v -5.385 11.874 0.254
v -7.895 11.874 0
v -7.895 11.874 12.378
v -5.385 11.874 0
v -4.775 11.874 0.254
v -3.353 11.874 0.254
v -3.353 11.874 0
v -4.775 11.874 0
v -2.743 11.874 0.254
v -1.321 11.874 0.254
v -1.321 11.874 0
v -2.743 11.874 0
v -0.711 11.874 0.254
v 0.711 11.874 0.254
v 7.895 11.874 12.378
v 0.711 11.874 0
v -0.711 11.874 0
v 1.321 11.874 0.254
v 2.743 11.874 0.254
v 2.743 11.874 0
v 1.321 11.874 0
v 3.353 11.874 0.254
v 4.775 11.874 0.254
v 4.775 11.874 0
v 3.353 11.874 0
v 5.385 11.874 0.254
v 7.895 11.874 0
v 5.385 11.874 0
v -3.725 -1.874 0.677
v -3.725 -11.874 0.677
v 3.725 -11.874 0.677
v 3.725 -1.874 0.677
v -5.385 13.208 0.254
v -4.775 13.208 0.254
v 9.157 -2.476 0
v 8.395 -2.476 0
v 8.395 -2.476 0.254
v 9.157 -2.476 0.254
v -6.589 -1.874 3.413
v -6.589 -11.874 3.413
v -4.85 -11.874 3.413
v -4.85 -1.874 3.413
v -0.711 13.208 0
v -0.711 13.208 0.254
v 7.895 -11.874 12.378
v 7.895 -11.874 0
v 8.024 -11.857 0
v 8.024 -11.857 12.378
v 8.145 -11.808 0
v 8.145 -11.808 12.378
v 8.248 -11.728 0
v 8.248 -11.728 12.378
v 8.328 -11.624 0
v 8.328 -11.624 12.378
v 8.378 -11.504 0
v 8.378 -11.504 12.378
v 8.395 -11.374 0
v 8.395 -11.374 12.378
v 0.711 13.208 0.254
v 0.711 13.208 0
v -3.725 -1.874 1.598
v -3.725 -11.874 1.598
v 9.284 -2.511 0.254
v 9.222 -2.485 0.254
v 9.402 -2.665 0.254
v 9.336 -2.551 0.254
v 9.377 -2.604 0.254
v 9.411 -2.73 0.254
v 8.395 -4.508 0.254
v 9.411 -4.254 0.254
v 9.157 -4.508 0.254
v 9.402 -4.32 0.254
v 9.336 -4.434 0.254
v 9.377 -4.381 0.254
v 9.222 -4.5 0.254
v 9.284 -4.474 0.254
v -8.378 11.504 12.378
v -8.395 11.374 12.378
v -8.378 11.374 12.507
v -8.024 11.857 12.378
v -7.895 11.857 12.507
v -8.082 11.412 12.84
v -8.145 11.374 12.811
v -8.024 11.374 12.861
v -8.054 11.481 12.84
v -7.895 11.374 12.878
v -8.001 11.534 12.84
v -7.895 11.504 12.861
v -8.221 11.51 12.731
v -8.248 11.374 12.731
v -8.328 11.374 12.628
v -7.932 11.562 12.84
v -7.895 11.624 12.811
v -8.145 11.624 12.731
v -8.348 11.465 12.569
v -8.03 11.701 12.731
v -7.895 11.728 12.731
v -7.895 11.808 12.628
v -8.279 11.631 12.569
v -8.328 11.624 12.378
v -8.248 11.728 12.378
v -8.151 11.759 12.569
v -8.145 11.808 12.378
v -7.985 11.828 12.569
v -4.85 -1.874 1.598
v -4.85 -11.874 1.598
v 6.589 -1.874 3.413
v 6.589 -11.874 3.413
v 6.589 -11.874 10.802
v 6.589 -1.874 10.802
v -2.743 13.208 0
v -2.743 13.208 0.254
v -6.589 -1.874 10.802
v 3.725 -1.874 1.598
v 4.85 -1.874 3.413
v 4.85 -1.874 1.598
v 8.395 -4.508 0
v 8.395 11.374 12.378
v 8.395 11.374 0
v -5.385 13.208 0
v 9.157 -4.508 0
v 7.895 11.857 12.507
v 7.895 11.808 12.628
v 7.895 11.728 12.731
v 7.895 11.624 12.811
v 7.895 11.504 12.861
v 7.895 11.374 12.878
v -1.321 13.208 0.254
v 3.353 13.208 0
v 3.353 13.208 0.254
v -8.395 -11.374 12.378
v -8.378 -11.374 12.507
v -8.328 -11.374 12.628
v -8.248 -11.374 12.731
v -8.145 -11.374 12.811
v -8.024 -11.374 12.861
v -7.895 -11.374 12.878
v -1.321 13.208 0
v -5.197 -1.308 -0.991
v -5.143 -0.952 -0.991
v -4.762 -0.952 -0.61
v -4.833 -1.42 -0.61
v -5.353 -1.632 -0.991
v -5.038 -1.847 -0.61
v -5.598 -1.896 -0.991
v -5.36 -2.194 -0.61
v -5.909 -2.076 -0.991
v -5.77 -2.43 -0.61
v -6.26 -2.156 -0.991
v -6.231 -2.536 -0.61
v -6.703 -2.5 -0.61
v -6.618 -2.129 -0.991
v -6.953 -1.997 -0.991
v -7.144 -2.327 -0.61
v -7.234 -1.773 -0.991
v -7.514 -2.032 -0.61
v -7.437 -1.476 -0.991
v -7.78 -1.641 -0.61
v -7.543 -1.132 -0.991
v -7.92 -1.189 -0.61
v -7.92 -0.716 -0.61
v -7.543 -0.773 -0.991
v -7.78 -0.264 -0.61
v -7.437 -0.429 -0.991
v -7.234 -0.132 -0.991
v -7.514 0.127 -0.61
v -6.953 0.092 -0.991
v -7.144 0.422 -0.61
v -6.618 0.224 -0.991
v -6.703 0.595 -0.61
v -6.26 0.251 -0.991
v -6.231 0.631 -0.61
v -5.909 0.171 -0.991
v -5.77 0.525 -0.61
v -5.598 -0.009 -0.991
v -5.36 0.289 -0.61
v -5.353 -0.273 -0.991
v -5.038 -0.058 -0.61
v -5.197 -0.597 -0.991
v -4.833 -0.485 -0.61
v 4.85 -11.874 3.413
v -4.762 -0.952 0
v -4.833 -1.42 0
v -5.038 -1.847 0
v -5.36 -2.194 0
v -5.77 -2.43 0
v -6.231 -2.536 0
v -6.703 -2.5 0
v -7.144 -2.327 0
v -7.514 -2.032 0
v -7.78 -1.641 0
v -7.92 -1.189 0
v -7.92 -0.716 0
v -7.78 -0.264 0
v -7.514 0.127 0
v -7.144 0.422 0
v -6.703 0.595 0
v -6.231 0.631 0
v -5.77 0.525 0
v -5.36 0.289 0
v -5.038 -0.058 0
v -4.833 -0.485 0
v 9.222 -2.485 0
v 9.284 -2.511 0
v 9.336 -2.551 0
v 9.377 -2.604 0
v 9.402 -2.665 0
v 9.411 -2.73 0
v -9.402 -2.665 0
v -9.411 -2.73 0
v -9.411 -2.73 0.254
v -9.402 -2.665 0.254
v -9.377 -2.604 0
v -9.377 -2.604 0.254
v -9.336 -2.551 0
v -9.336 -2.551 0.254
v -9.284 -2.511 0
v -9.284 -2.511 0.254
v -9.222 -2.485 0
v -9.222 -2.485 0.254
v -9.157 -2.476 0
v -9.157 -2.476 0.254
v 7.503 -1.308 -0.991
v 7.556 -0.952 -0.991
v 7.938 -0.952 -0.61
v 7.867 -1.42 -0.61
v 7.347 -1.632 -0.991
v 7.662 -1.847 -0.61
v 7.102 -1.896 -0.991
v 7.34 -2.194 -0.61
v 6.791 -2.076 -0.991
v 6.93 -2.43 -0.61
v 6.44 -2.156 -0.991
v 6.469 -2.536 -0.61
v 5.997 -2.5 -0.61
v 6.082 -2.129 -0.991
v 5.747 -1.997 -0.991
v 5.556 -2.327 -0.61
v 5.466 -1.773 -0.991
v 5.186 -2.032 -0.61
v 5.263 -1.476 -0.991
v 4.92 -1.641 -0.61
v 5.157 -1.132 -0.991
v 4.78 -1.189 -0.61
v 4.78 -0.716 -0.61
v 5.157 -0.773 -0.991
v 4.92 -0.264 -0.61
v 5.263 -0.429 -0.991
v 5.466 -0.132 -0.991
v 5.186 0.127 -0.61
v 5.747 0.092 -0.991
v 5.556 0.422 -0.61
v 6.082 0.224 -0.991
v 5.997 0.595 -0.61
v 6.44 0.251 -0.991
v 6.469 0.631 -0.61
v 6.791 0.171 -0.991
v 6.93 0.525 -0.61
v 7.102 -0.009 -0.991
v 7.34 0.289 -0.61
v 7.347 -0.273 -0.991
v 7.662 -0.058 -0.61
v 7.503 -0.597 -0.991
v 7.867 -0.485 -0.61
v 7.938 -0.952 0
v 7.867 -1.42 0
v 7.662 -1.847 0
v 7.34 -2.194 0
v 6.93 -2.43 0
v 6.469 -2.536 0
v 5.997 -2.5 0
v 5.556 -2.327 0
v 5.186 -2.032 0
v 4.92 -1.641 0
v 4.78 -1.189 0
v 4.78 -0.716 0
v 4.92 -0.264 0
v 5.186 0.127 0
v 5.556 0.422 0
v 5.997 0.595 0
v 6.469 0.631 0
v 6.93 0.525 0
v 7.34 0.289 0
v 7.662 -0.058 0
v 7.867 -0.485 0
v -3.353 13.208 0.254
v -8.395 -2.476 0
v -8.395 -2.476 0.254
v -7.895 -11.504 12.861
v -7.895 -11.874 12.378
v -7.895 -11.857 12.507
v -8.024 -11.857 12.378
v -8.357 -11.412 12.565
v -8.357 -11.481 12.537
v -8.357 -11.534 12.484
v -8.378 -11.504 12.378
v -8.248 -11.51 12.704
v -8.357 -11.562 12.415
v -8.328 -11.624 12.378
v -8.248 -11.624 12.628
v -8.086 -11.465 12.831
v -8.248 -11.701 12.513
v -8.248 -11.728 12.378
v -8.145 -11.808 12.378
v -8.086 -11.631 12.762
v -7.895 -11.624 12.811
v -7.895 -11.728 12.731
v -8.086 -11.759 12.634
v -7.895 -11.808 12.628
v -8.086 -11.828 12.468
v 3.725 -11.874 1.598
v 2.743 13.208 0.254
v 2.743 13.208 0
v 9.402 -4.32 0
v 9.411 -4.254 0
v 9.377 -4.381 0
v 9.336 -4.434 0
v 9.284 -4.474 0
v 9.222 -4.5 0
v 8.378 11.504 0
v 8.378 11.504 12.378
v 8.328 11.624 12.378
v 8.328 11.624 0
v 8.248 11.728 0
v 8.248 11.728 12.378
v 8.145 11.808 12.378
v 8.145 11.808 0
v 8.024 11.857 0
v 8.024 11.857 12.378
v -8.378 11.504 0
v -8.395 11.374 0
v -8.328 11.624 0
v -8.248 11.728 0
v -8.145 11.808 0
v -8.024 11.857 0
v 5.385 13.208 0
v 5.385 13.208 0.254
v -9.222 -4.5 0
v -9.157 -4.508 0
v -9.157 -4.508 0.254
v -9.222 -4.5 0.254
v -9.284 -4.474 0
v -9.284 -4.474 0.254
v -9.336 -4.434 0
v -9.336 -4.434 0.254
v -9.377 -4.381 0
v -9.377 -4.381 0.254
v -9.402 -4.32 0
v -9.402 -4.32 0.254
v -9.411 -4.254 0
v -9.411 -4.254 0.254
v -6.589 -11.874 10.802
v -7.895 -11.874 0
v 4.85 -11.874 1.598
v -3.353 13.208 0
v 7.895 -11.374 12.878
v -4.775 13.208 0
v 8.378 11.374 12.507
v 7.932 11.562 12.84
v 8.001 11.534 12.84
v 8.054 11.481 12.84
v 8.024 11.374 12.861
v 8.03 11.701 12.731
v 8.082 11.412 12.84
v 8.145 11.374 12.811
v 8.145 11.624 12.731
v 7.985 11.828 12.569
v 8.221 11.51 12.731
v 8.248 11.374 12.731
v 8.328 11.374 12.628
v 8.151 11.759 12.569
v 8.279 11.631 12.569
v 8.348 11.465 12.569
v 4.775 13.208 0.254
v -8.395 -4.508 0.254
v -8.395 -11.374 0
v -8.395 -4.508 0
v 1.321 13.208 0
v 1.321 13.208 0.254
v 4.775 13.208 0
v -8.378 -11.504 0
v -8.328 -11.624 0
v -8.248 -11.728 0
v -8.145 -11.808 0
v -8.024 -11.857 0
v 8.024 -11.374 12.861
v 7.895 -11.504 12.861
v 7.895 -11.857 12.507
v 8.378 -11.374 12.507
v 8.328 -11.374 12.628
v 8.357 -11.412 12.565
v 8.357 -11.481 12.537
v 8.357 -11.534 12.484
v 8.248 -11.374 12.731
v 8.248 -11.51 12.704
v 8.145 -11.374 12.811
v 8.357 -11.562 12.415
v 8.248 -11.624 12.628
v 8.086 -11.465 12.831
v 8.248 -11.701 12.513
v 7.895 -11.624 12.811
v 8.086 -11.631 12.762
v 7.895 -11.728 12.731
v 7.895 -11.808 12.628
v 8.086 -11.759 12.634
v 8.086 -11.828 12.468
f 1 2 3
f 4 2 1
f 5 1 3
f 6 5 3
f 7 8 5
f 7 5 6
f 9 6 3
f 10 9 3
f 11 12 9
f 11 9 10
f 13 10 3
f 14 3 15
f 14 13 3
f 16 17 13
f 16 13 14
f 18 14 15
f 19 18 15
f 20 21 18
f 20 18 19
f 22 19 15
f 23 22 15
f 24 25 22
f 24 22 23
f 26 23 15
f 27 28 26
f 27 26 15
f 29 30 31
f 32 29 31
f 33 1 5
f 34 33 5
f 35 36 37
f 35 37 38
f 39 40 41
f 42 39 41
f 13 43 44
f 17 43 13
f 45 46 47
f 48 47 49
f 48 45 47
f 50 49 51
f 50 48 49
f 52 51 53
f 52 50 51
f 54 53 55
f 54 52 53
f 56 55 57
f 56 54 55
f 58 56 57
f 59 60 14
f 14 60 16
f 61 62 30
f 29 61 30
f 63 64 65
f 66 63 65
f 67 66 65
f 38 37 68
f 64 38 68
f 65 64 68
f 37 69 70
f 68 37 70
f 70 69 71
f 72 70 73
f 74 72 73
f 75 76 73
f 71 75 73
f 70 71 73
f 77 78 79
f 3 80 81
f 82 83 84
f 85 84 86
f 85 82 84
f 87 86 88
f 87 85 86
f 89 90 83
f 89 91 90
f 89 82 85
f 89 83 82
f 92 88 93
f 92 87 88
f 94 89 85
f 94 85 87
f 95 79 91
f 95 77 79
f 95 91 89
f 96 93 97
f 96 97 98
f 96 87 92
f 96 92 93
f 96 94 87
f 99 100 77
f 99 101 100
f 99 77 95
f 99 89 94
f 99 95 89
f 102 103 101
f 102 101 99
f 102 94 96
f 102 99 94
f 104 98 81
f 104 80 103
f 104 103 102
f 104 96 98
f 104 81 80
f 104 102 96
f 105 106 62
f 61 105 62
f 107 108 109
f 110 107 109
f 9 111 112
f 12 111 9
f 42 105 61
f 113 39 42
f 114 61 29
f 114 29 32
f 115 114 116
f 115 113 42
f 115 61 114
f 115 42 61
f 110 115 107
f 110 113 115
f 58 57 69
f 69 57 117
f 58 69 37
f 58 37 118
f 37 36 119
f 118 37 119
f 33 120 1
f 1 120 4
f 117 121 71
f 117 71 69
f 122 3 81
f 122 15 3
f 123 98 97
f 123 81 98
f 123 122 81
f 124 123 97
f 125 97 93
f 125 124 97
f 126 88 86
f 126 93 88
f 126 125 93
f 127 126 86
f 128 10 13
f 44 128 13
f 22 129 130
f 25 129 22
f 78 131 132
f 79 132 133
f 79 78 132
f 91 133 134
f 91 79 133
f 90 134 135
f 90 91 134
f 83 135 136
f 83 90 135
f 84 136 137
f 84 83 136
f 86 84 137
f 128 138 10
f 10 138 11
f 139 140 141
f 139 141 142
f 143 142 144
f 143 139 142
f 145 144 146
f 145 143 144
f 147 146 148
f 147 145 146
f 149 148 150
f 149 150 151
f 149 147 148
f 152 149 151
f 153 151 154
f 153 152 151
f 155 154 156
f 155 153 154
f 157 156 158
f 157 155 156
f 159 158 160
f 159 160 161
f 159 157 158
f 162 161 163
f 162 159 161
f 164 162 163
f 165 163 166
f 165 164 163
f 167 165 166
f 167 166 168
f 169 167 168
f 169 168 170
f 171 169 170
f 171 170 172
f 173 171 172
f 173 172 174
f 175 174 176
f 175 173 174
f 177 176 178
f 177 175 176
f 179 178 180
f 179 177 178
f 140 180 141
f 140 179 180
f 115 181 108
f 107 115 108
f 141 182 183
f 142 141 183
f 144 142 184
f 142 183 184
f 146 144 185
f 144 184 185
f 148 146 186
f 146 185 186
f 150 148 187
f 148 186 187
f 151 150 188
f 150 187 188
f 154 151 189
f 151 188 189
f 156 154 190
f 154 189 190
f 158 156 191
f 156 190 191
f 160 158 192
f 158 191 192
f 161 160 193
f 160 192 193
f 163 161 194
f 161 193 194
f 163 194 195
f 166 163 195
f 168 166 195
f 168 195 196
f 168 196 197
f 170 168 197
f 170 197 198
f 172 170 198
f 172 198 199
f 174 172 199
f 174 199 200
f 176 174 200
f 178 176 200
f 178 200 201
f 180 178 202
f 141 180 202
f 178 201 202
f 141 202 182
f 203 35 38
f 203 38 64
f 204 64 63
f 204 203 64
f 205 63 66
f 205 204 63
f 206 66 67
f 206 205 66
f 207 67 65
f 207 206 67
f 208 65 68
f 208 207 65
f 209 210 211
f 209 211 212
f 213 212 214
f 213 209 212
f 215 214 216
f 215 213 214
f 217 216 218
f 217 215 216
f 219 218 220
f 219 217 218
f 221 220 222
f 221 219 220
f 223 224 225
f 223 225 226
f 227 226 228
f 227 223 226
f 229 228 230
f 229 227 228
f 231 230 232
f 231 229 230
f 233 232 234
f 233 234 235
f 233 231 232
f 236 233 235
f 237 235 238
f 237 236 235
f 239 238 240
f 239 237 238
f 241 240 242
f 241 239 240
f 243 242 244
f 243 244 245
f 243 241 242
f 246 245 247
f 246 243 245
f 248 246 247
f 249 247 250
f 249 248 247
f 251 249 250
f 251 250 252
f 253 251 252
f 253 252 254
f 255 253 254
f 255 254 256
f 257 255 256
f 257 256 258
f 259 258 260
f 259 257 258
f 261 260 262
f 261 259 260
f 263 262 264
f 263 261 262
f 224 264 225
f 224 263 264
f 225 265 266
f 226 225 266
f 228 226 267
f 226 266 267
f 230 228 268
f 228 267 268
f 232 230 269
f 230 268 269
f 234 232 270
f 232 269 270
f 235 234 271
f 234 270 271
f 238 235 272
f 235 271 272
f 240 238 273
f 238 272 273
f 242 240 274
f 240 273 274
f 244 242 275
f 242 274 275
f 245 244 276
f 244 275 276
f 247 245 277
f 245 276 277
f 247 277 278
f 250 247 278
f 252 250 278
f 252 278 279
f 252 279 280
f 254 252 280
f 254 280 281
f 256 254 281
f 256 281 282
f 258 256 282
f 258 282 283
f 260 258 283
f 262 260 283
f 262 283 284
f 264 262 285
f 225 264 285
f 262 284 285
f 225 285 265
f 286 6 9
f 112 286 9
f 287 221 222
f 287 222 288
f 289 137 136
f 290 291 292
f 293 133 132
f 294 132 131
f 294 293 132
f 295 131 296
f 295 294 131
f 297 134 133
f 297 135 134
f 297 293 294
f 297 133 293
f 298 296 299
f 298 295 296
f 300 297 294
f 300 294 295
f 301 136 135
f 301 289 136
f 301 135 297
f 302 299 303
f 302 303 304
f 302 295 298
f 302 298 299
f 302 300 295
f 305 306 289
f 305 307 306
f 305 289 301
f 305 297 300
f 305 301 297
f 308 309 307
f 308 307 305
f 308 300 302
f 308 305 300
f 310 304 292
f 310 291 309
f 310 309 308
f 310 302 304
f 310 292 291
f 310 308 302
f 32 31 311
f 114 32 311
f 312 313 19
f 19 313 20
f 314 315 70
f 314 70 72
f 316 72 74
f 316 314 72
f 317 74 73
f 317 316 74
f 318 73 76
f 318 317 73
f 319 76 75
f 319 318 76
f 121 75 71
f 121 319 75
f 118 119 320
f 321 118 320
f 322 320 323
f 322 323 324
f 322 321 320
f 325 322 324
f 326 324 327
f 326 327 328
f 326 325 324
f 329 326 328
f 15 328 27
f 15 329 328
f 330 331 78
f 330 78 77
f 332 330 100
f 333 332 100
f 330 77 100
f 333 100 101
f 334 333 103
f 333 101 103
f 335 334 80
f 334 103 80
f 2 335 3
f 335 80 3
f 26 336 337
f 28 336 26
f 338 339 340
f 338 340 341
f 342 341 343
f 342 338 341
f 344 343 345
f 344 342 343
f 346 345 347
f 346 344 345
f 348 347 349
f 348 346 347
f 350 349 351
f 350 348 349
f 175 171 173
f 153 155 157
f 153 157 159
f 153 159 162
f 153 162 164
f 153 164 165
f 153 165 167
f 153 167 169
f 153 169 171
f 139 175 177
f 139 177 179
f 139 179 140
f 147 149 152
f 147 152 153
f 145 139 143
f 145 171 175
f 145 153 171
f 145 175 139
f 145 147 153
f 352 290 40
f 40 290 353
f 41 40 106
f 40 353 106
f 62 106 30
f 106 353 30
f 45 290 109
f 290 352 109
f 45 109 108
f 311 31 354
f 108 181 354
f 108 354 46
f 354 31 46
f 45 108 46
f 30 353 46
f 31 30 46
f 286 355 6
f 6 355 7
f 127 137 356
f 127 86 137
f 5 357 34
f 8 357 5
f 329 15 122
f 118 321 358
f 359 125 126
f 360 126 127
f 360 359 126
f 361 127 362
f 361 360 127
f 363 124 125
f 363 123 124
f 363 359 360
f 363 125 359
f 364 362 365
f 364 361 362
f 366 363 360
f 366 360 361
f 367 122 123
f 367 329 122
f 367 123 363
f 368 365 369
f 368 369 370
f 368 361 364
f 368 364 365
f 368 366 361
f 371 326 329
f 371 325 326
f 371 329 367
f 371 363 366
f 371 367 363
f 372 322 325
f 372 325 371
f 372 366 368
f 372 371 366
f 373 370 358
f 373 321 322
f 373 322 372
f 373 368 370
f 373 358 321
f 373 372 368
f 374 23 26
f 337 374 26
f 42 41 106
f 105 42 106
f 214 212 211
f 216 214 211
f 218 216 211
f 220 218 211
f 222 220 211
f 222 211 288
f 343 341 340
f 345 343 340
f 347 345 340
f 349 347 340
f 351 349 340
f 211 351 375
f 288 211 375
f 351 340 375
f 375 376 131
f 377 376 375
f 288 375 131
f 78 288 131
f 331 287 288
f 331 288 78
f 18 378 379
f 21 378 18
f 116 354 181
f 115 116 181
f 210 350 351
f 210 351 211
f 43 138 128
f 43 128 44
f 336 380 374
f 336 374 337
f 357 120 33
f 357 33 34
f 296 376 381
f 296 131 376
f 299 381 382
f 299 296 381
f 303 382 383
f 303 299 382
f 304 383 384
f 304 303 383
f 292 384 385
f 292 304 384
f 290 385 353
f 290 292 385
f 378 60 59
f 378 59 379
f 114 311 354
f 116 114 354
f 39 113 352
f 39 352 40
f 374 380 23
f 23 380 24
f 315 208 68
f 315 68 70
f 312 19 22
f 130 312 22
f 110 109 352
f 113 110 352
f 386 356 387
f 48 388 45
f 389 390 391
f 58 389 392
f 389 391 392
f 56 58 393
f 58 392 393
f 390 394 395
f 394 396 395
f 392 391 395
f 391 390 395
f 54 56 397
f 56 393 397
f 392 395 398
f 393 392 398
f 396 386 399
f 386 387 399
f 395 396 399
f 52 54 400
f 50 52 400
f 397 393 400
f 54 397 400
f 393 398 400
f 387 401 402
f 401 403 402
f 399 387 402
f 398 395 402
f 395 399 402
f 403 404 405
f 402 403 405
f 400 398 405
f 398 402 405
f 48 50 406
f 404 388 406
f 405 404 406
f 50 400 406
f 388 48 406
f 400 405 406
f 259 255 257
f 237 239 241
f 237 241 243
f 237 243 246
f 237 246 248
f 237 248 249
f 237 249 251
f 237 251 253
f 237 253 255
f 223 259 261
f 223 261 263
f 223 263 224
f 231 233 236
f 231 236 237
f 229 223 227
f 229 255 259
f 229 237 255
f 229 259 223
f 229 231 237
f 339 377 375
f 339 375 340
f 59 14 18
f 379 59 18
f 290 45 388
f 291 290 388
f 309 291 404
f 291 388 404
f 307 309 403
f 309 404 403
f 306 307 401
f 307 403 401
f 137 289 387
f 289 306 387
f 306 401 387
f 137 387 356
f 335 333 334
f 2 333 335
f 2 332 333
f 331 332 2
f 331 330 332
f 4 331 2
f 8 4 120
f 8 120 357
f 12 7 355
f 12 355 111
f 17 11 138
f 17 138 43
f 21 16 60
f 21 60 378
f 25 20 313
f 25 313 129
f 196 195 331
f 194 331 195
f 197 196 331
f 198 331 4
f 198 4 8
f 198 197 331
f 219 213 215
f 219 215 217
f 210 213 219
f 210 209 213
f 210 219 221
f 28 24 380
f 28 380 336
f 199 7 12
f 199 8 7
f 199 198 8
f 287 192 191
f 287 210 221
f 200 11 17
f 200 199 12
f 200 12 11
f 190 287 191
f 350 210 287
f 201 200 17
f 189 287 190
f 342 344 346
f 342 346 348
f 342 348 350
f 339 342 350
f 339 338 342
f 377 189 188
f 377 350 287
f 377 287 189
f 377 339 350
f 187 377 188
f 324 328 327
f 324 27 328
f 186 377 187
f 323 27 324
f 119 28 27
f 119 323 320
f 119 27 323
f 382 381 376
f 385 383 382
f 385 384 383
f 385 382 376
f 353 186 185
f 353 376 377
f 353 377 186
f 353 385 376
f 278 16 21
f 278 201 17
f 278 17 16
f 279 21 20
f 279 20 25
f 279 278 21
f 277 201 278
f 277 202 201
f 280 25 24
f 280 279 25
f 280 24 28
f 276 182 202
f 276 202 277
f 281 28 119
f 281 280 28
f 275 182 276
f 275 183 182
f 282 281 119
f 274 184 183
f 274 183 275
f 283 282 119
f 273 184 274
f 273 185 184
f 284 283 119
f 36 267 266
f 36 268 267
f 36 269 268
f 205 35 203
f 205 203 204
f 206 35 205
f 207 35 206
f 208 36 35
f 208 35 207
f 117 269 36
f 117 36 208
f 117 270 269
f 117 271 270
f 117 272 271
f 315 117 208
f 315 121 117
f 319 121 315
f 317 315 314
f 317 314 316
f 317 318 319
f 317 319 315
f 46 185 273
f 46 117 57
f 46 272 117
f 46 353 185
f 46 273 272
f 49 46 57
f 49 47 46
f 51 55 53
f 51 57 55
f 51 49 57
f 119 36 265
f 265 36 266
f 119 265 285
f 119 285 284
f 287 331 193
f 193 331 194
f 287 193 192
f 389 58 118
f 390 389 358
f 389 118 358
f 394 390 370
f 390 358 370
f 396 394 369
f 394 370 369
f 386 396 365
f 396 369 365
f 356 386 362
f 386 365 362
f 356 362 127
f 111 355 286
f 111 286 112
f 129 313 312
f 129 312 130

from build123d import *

# Parameters (mm, degrees)
F0_W     = 16.7894
F0_H     = 23.749
F1_DEPTH = 12.8778
F2_R     = 0.5
F4_DEPTH = 10
F5_R     = 1.5875
F6_DEPTH = 0.9906
F7_W     = 0.6096
F7_H     = 1.397
F8_DEPTH = 0.254
F9_SIZE  = 0.381


with BuildPart() as f1:
    # F0 (on Top) → F1 (new body)
    with BuildSketch(Plane.XY):
        Rectangle(F0_W, F0_H)
    extrude(amount=F1_DEPTH)

    # F2
    f2_edges = [f1.edges().sort_by_distance(p)[0] for p in [
        (8.3947, 11.8745, 6.4389),
        (-8.3947, 11.8745, 6.4389),
        (0, -11.8745, 12.8778),
        (-8.3947, 0, 12.8778),
        (0, 11.8745, 12.8778),
        (8.3947, 0, 12.8778),
        (-8.3947, -11.8745, 6.4389),
        (8.3947, -11.8745, 6.4389),
    ]]
    fillet(f2_edges, radius=F2_R)

    # F3 (on face) → F4 (cut)
    with BuildSketch(Plane.XZ.offset(11.8745)):
        Polygon((6.5885786898, 10.8017679304), (0, 10.8017679304), (-6.5885786898, 10.8017679304), (-6.5885786898, 3.4128425177), (-4.8500075936, 3.4128425177), (-4.8500075936, 1.597570139), (-3.7250500172, 1.597570139), (-3.7250500172, 0.6771502085), (0, 0.6771502085), (3.7250500172, 0.6771502085), (3.7250500172, 1.597570139), (4.8500075936, 1.597570139), (4.8500075936, 3.4128425177), (6.5885786898, 3.4128425177), align=None)
    extrude(amount=-F4_DEPTH, mode=Mode.SUBTRACT)

    # F5 (on face) → F6 (join)
    with BuildSketch(Plane(origin=(0, 0, 0), x_dir=(1, 0, 0), z_dir=(0, 0, -1))):
        with Locations((6.35, 0.9525)):
            Circle(F5_R)
        with Locations((-6.35, 0.9525)):
            Circle(F5_R)
    extrude(amount=F6_DEPTH)

    # F7 (on face) → F8 (join)
    with BuildSketch(Plane(origin=(0, 0, 0), x_dir=(1, 0, 0), z_dir=(0, 0, -1))):
        with Locations((1.016, -12.5095)):
            Rectangle(F7_W, F7_H)
        with Locations((3.048, -12.5095)):
            Rectangle(F7_W, F7_H)
        with Locations((5.08, -12.5095)):
            Rectangle(F7_W, F7_H)
        with Locations((-1.016, -12.5095)):
            Rectangle(F7_W, F7_H)
        with Locations((-5.08, -12.5095)):
            Rectangle(F7_W, F7_H)
        with Locations((-3.048, -12.5095)):
            Rectangle(F7_W, F7_H)
        with BuildLine():
            Line((9.1567, 4.5085), (8.3947, 4.5085))
            Line((8.3947, 4.5085), (8.3947, 2.4765))
            Line((8.3947, 2.4765), (9.1567, 2.4765))
            ThreePointArc((9.1567, 2.4765), (9.3363051224, 2.5508948776), (9.4107, 2.7305))
            Line((9.4107, 2.7305), (9.4107, 4.2545))
            ThreePointArc((9.4107, 4.2545), (9.3363051224, 4.4341051224), (9.1567, 4.5085))
        make_face()
        with BuildLine():
            ThreePointArc((-9.1567, 4.5085), (-9.3363051224, 4.4341051224), (-9.4107, 4.2545))
            Line((-9.4107, 4.2545), (-9.4107, 2.7305))
            ThreePointArc((-9.4107, 2.7305), (-9.3363051224, 2.5508948776), (-9.1567, 2.4765))
            Line((-9.1567, 2.4765), (-8.3947, 2.4765))
            Line((-8.3947, 2.4765), (-8.3947, 4.5085))
            Line((-8.3947, 4.5085), (-9.1567, 4.5085))
        make_face()
    extrude(amount=-F8_DEPTH)

    # F9
    f9_edges = [f1.edges().sort_by_distance(p)[0] for p in [
        (4.7625, -0.9525, -0.9906),
        (-7.9375, -0.9525, -0.9906),
    ]]
    chamfer(f9_edges, length=F9_SIZE)


solid = f1.part
